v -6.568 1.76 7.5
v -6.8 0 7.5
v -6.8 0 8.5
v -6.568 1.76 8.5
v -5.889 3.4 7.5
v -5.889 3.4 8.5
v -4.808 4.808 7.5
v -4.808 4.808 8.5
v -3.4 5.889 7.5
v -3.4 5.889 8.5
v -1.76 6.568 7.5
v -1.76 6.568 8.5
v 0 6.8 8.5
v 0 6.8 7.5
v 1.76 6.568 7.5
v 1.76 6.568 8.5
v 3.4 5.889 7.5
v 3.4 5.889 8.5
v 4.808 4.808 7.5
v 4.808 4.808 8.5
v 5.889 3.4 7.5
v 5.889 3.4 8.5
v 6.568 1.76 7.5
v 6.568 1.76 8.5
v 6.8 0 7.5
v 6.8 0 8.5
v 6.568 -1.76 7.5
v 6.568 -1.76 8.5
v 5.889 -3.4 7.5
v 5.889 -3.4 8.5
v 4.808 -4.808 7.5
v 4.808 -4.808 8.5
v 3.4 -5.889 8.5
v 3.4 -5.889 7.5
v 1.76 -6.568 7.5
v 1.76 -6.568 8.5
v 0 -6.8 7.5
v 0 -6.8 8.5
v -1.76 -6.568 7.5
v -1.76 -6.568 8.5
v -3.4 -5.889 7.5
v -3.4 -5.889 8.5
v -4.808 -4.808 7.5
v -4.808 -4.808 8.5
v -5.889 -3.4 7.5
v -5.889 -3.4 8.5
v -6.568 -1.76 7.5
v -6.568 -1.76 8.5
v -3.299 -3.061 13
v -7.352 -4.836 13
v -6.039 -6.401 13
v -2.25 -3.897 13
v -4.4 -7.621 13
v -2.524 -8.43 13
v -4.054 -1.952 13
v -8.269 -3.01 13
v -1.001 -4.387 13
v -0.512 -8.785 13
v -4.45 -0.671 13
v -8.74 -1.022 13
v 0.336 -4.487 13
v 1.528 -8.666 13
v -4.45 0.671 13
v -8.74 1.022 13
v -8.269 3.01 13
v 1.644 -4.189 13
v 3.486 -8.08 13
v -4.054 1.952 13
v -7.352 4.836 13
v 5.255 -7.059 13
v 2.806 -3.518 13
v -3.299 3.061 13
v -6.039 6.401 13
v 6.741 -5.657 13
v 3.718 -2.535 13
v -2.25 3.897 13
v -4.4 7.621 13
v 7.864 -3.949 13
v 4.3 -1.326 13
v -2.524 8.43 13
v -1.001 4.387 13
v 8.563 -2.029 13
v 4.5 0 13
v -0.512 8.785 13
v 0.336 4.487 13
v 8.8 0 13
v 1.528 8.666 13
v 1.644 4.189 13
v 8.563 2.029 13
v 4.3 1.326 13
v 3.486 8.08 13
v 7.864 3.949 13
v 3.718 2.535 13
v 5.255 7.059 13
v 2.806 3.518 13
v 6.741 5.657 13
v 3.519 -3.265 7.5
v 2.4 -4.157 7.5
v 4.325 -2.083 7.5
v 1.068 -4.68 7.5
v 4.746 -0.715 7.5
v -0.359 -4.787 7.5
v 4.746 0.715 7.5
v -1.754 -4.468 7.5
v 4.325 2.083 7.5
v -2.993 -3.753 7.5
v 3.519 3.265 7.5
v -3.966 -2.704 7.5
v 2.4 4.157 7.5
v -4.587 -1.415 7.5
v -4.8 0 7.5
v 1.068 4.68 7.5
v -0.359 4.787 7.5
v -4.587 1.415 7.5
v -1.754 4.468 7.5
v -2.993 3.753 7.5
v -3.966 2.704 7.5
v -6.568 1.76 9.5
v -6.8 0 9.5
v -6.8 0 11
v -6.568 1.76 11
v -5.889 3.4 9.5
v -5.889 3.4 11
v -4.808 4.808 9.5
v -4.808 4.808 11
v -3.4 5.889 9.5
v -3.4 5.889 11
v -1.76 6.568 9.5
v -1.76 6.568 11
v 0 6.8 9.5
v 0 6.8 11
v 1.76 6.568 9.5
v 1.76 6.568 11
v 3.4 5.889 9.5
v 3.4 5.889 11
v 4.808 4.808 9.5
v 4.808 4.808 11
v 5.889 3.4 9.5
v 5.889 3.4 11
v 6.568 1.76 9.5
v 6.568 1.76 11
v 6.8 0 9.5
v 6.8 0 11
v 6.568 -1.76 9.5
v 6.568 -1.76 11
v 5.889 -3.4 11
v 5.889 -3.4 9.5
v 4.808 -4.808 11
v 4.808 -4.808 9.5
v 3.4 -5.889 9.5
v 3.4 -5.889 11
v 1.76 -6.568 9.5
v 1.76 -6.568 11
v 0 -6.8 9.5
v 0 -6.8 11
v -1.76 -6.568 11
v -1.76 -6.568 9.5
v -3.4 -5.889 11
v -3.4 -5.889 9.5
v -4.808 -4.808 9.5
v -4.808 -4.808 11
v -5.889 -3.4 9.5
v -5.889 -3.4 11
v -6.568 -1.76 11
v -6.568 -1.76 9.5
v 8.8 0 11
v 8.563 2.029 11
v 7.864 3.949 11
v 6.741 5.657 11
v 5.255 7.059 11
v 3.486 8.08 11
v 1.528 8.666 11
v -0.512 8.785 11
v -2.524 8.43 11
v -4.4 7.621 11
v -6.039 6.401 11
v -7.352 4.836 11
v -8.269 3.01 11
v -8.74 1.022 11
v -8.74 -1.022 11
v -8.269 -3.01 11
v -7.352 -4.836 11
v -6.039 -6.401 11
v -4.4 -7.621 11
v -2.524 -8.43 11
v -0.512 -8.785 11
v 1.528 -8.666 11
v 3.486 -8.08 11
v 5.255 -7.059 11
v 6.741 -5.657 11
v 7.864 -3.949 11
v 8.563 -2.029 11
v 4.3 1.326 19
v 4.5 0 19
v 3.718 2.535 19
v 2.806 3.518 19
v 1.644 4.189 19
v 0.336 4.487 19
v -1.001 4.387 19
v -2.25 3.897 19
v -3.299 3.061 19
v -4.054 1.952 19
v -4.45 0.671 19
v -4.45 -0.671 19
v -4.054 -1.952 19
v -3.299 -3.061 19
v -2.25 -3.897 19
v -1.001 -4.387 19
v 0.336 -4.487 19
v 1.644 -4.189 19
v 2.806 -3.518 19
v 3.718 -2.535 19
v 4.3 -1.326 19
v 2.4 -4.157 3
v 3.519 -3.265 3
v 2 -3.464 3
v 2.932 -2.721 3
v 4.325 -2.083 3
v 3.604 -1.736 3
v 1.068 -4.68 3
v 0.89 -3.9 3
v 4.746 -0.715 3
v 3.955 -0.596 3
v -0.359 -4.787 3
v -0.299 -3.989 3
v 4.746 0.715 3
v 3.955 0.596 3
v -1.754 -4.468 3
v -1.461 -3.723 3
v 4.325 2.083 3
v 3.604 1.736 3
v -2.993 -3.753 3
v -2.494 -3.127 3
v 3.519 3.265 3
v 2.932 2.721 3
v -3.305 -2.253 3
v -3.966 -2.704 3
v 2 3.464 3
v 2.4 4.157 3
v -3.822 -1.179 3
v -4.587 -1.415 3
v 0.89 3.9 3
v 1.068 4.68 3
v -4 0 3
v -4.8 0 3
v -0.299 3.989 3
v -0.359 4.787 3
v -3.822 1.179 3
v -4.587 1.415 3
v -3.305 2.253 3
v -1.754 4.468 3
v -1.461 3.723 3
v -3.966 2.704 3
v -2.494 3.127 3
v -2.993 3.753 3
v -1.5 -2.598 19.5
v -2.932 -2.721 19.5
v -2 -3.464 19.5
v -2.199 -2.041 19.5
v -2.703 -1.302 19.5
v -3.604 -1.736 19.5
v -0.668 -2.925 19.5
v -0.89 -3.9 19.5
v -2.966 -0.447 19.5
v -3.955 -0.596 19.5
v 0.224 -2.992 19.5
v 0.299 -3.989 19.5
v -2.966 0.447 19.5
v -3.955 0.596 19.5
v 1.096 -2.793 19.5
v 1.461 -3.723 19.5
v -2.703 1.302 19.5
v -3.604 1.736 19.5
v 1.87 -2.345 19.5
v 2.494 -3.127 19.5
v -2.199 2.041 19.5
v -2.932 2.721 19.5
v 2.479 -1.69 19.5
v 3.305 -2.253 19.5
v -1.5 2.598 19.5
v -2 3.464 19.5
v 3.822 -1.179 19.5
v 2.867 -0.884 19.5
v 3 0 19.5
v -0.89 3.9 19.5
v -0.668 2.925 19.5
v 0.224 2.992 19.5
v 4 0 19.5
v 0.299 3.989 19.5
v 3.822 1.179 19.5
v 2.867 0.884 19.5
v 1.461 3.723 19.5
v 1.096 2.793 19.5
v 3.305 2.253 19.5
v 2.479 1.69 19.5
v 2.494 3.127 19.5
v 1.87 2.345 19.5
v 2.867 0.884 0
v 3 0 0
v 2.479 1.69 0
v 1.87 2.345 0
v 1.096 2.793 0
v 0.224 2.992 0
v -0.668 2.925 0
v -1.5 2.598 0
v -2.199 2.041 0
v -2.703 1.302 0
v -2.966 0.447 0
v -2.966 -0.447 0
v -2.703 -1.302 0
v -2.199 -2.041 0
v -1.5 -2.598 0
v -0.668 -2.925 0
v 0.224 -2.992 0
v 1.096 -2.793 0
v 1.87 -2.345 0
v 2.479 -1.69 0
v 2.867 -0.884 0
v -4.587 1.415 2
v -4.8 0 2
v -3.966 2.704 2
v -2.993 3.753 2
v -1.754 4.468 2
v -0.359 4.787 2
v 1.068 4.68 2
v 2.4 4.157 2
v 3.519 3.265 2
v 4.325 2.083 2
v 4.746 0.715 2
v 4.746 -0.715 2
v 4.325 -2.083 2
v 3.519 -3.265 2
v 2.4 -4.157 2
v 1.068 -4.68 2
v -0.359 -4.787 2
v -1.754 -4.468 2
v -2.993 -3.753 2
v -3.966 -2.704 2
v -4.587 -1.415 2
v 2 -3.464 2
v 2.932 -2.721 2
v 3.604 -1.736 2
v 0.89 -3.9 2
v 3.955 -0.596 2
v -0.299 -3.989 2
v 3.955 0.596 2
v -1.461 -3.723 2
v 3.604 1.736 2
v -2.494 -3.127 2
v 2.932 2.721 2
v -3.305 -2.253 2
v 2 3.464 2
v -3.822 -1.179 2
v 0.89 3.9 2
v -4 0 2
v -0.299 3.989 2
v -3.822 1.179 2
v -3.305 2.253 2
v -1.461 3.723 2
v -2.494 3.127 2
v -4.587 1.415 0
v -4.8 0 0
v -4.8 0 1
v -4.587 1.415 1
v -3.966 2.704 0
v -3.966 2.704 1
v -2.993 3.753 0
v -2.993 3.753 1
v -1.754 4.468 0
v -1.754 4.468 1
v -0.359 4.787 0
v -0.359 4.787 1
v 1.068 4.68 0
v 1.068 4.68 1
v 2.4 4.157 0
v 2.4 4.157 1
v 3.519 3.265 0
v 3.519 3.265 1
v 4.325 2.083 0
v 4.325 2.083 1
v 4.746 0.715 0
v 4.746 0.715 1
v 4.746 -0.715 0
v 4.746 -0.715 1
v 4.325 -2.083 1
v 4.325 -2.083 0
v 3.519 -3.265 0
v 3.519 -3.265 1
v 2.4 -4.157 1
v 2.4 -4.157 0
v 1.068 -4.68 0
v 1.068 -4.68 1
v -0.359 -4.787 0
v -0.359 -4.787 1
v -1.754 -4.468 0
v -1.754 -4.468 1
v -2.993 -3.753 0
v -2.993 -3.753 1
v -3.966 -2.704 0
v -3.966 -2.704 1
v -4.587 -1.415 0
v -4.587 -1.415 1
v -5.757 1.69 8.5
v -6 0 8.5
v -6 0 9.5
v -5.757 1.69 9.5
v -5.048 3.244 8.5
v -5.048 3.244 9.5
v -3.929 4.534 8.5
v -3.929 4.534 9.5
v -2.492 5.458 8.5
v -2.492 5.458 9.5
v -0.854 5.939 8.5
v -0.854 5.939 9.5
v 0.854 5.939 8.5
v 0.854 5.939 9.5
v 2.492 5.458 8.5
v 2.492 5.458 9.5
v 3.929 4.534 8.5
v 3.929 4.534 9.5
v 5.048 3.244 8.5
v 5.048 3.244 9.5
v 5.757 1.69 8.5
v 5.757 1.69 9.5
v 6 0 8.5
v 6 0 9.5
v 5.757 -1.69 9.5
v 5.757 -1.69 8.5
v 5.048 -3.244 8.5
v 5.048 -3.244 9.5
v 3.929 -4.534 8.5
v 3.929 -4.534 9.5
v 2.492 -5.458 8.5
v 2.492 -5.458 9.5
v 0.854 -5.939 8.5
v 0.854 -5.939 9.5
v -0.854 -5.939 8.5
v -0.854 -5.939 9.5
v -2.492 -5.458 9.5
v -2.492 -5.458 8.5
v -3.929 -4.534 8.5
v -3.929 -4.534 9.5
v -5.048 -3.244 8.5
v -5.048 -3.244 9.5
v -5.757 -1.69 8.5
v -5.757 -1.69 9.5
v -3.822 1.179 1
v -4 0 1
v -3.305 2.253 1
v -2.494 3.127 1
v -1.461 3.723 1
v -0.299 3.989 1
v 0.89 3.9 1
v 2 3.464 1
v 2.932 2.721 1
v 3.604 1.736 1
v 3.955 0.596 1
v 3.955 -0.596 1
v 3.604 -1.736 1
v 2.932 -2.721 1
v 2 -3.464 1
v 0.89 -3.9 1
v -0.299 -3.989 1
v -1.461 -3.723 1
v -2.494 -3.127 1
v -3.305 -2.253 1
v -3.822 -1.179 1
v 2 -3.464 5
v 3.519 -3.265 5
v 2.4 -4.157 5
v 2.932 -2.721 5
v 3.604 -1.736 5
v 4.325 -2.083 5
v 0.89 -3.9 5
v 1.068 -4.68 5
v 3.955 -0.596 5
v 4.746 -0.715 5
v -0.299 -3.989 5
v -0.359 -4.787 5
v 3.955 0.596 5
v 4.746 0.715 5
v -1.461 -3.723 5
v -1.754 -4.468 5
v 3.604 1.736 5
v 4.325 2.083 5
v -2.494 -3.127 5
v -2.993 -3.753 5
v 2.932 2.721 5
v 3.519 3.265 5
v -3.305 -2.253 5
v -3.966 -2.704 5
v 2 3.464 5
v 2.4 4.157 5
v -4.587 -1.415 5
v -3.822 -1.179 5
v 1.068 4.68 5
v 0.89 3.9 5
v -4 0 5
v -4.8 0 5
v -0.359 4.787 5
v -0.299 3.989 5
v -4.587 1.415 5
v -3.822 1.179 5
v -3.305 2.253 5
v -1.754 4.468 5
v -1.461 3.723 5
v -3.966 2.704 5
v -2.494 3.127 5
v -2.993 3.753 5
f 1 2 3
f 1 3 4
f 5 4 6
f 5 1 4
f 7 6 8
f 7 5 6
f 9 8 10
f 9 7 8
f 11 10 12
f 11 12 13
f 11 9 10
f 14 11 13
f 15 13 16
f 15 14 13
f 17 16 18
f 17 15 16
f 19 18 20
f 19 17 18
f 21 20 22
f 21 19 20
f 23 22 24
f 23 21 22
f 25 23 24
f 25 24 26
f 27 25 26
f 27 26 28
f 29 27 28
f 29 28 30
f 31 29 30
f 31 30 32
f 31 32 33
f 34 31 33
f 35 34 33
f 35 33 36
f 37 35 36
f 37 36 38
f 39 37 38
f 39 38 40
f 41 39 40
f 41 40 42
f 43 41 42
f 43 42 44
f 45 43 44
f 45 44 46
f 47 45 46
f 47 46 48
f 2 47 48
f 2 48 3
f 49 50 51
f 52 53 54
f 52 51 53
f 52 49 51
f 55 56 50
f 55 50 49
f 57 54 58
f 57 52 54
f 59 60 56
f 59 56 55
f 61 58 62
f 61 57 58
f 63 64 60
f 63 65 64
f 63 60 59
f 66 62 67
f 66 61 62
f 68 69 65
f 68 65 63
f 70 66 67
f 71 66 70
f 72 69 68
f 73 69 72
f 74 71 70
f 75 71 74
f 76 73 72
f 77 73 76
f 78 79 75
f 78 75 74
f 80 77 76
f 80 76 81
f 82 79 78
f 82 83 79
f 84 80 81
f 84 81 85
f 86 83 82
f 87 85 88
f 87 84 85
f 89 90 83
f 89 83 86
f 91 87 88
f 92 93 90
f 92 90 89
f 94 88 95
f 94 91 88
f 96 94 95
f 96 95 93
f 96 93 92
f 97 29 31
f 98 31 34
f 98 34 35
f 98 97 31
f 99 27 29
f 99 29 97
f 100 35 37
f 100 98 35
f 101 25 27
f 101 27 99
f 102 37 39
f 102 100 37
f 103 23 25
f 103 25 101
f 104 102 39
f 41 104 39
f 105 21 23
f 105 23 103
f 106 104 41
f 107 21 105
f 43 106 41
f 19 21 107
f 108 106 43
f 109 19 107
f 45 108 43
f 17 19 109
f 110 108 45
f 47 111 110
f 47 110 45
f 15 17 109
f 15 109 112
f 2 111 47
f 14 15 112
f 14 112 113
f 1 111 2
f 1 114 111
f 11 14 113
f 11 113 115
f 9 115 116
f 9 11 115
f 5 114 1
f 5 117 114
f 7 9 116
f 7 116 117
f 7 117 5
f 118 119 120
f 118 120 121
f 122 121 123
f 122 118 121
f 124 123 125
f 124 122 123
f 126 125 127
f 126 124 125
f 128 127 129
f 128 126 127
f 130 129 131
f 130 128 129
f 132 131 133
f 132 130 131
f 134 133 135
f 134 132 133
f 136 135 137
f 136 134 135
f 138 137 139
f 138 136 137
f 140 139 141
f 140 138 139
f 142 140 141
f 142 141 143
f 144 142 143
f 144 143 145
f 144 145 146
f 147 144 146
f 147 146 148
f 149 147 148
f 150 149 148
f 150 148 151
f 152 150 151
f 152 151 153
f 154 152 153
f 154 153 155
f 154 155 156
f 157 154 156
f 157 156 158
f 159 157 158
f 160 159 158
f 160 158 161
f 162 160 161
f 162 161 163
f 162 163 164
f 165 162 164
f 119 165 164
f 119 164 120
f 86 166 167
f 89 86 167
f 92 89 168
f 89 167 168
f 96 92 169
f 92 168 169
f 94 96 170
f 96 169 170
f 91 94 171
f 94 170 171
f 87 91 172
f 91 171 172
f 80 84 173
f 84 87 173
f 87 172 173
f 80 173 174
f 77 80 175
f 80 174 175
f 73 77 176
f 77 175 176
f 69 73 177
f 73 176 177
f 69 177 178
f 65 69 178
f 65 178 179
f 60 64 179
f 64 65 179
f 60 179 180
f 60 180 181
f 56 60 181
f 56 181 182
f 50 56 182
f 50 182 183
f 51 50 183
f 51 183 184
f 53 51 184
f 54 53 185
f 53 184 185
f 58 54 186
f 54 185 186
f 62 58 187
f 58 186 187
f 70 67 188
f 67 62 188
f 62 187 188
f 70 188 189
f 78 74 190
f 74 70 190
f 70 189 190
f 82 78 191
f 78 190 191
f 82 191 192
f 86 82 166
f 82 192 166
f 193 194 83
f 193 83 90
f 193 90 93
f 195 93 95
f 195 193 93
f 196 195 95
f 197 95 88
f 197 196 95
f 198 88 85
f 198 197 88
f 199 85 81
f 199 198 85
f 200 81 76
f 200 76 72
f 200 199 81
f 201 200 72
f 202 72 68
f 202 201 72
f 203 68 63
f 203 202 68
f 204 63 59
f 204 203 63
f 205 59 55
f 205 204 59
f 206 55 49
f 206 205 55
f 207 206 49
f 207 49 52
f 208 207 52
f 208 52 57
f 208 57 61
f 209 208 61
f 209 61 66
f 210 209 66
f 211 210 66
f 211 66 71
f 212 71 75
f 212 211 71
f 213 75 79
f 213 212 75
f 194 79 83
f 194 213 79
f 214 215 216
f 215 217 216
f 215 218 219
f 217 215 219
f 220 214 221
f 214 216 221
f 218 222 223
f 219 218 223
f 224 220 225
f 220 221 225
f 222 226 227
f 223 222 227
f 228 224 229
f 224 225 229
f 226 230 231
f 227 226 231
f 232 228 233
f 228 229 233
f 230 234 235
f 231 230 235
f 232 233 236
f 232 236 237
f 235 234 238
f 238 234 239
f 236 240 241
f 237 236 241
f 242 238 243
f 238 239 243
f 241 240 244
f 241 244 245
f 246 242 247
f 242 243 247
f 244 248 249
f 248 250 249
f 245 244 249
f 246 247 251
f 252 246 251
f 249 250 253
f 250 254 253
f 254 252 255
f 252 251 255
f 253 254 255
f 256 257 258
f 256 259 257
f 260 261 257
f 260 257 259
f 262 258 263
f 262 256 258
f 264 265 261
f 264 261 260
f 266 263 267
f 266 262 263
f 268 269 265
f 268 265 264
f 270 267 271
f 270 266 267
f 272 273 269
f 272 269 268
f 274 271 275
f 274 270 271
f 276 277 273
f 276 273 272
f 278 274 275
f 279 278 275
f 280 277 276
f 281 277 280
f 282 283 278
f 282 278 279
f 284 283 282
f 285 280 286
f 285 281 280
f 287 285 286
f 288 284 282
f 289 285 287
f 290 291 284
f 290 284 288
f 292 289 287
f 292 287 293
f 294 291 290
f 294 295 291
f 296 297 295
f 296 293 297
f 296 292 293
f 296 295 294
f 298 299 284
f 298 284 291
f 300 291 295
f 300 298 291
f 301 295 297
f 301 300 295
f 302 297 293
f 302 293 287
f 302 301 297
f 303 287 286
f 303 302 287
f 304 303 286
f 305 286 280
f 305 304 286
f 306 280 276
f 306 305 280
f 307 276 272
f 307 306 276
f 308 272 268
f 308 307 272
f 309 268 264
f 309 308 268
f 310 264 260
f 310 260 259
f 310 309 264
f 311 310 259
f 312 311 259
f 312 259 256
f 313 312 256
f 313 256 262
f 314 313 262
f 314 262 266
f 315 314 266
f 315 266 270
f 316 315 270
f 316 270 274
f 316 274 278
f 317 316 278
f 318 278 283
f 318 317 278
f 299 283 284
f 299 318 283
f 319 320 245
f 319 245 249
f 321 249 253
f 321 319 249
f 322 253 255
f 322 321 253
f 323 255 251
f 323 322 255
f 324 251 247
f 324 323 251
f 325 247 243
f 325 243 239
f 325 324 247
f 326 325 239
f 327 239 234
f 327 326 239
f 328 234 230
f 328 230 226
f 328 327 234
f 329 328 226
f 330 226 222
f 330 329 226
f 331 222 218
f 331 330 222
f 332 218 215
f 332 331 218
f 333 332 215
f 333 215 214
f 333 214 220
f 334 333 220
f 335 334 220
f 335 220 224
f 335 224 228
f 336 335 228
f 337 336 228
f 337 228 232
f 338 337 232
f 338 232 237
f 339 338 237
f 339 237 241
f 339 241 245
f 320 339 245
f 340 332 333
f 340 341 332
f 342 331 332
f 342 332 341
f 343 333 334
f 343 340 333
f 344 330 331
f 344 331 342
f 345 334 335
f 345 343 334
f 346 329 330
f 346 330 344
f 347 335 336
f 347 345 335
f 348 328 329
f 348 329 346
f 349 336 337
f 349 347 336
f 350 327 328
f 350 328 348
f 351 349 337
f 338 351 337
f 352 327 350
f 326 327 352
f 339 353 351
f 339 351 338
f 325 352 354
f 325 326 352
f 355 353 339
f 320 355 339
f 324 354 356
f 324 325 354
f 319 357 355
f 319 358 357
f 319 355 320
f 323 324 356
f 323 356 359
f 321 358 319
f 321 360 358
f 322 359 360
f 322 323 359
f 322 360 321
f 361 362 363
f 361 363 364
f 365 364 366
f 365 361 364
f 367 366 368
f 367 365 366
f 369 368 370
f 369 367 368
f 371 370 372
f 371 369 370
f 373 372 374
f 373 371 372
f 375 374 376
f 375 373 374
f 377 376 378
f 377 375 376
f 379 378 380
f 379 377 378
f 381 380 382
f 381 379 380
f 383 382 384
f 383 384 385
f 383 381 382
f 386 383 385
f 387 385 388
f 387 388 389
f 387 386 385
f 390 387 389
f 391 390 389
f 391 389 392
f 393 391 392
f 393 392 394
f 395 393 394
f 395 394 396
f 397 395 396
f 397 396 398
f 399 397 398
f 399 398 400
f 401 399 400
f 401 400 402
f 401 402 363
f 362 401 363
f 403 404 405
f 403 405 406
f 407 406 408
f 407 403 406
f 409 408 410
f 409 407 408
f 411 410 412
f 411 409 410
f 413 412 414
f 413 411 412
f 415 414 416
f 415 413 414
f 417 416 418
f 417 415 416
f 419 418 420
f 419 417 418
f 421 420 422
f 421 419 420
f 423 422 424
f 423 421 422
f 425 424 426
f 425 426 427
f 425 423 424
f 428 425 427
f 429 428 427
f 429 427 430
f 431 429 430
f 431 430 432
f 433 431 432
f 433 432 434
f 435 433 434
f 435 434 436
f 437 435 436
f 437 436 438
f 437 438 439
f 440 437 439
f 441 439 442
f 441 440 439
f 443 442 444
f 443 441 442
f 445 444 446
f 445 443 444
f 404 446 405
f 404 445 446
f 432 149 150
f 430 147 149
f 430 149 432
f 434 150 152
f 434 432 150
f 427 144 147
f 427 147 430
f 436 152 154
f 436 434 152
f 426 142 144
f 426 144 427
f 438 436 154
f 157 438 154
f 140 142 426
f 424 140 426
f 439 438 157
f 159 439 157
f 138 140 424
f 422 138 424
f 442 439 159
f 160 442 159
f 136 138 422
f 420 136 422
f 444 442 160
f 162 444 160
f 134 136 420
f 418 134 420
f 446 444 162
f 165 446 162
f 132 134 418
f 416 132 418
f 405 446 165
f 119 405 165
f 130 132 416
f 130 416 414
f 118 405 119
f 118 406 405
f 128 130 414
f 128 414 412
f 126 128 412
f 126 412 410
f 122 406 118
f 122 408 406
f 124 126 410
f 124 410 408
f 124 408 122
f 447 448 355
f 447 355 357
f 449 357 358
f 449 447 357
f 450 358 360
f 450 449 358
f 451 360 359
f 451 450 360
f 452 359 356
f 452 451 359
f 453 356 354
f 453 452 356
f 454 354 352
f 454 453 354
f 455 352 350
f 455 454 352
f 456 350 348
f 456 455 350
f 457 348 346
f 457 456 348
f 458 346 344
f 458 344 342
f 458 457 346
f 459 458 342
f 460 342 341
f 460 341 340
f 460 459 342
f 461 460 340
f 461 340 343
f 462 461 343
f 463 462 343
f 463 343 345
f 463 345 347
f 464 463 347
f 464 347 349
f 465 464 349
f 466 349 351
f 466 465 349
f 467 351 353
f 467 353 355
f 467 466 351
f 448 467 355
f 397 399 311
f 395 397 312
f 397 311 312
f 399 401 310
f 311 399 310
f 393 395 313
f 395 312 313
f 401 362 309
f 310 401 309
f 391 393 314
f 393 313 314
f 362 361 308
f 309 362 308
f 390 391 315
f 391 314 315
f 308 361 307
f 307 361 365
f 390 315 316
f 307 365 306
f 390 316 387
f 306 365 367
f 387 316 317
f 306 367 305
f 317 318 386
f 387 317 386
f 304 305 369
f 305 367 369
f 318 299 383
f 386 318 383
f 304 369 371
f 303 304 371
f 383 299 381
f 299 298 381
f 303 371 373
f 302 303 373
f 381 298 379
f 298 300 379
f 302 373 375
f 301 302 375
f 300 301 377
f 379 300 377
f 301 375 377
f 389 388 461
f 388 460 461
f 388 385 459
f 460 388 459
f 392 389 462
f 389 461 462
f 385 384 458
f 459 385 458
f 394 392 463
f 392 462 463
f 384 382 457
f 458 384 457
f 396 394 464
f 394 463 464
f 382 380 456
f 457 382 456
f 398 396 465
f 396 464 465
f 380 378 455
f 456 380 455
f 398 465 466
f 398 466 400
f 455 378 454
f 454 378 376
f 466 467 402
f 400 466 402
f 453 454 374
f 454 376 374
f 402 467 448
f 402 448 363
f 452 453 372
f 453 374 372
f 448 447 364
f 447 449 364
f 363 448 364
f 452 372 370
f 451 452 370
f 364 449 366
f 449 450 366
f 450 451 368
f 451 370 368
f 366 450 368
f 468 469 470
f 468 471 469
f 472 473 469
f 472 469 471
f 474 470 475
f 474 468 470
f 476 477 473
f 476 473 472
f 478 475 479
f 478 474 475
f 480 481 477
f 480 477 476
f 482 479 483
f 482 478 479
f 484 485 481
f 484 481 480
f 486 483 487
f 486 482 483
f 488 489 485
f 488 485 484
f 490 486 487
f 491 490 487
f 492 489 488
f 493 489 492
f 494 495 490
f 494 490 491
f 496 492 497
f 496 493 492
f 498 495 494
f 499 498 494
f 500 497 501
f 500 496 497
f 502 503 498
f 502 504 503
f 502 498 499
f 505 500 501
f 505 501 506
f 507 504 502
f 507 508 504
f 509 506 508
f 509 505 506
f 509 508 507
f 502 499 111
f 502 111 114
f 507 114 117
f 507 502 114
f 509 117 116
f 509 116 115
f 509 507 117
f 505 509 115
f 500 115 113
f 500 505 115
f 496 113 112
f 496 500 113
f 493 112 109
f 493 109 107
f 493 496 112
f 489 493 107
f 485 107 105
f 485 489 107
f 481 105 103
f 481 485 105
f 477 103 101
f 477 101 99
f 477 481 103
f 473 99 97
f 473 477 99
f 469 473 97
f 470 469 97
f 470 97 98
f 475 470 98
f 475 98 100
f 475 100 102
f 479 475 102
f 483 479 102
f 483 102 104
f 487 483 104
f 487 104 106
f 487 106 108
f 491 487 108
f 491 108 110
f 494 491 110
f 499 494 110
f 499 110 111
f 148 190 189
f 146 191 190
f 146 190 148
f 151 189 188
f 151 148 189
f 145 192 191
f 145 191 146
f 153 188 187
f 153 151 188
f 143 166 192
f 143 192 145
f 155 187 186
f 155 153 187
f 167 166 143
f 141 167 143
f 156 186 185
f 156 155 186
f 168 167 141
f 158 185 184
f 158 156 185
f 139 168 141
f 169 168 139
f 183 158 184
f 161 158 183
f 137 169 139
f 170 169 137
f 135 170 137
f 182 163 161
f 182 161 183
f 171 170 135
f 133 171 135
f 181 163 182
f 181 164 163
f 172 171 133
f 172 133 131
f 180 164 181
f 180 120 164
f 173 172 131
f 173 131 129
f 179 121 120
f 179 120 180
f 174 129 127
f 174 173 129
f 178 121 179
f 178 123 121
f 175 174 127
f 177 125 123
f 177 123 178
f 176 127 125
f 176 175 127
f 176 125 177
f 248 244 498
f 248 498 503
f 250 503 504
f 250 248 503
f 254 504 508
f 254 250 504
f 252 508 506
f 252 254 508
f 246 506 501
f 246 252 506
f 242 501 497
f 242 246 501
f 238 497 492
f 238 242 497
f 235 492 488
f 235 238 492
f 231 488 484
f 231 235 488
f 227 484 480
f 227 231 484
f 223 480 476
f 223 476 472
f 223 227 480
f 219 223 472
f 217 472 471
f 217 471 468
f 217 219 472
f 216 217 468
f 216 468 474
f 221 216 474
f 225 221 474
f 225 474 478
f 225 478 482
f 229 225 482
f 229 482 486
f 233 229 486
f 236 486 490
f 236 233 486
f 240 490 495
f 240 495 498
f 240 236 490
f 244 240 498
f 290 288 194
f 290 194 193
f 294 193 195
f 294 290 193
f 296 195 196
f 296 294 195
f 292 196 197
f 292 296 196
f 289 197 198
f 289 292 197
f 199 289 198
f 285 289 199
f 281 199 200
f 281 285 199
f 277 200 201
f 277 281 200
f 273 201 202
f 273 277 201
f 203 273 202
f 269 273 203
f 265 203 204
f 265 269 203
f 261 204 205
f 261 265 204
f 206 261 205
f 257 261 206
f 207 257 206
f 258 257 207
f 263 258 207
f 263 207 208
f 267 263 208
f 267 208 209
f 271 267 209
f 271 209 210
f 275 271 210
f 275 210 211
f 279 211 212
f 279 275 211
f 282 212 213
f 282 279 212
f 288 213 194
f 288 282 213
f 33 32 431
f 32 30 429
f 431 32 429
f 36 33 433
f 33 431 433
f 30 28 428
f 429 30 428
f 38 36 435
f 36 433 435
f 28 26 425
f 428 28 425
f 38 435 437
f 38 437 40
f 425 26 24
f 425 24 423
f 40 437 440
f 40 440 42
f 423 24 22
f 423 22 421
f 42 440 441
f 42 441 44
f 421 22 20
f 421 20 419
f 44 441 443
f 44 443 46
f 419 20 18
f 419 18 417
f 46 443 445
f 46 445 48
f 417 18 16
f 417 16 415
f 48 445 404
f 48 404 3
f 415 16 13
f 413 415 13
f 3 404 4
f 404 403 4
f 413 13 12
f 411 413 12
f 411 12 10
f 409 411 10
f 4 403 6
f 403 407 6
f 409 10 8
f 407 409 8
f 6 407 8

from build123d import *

# Parameters (mm, degrees)
SKETCH1_R           = 8.8
SKETCH1_R_2         = 3
BOSS_EXTRUDE1_DEPTH = 19.5
SKETCH2_OUTSIDE_W   = 25.924
SKETCH2_OUTSIDE_H   = 25.924
SKETCH2_OUTSIDE_R   = 4.5
CUT_EXTRUDE1_DEPTH  = 6.5
SKETCH3_OUTSIDE_W   = 25.924
SKETCH3_OUTSIDE_H   = 25.924
SKETCH3_OUTSIDE_R   = 6.8
CUT_EXTRUDE2_DEPTH  = 11
SKETCH5_OUTSIDE_W   = 25.924
SKETCH5_OUTSIDE_H   = 25.924
SKETCH5_OUTSIDE_R   = 4.8
CUT_EXTRUDE3_DEPTH  = 7.5
CUT_EXTRUDE4_START  = -1
SKETCH4_OUTSIDE_W   = 25.924
SKETCH4_OUTSIDE_H   = 25.924
SKETCH4_OUTSIDE_R   = 6
CUT_EXTRUDE4_DEPTH  = 1
CUT_EXTRUDE5_START  = -1
SKETCH6_OUTSIDE_W   = 25.924
SKETCH6_OUTSIDE_H   = 25.924
SKETCH6_OUTSIDE_R   = 4
CUT_EXTRUDE5_DEPTH  = 1
CUT_EXTRUDE6_START  = -3
SKETCH6_2_OUTSIDE_W = 25.924
SKETCH6_2_OUTSIDE_H = 25.924
SKETCH6_2_OUTSIDE_R = 4
CUT_EXTRUDE6_DEPTH  = 2
CHAMFER1_SIZE       = 0.5


with BuildPart() as part:
    # Sketch1 → Boss-Extrude1 (new body)
    with BuildSketch(Plane.XY):
        Circle(SKETCH1_R)
        Circle(SKETCH1_R_2, mode=Mode.SUBTRACT)
    extrude(amount=BOSS_EXTRUDE1_DEPTH)

    # Sketch2 outside → Cut-Extrude1 (cut)
    with BuildSketch(Plane.XY.offset(19.5)):
        Rectangle(SKETCH2_OUTSIDE_W, SKETCH2_OUTSIDE_H)
        Circle(SKETCH2_OUTSIDE_R, mode=Mode.SUBTRACT)
    extrude(amount=-CUT_EXTRUDE1_DEPTH, mode=Mode.SUBTRACT)

    # Sketch3 outside → Cut-Extrude2 (cut)
    with BuildSketch(Plane(origin=(0, 0, 0), x_dir=(-1, 0, 0), z_dir=(0, 0, -1))):
        Rectangle(SKETCH3_OUTSIDE_W, SKETCH3_OUTSIDE_H)
        Circle(SKETCH3_OUTSIDE_R, mode=Mode.SUBTRACT)
    extrude(amount=-CUT_EXTRUDE2_DEPTH, mode=Mode.SUBTRACT)

    # Sketch5 outside → Cut-Extrude3 (cut)
    with BuildSketch(Plane(origin=(0, 0, 0), x_dir=(-1, 0, 0), z_dir=(0, 0, -1))):
        Rectangle(SKETCH5_OUTSIDE_W, SKETCH5_OUTSIDE_H)
        Circle(SKETCH5_OUTSIDE_R, mode=Mode.SUBTRACT)
    extrude(amount=-CUT_EXTRUDE3_DEPTH, mode=Mode.SUBTRACT)

    # Sketch4 outside → Cut-Extrude4 (cut)
    with BuildSketch(Plane(origin=(0, 0, 7.5), x_dir=(-1, 0, 0), z_dir=(0, 0, -1)).offset(CUT_EXTRUDE4_START)):
        Rectangle(SKETCH4_OUTSIDE_W, SKETCH4_OUTSIDE_H)
        Circle(SKETCH4_OUTSIDE_R, mode=Mode.SUBTRACT)
    extrude(amount=-CUT_EXTRUDE4_DEPTH, mode=Mode.SUBTRACT)

    # Sketch6 outside → Cut-Extrude5 (cut)
    with BuildSketch(Plane(origin=(0, 0, 0), x_dir=(-1, 0, 0), z_dir=(0, 0, -1)).offset(CUT_EXTRUDE5_START)):
        Rectangle(SKETCH6_OUTSIDE_W, SKETCH6_OUTSIDE_H)
        Circle(SKETCH6_OUTSIDE_R, mode=Mode.SUBTRACT)
    extrude(amount=-CUT_EXTRUDE5_DEPTH, mode=Mode.SUBTRACT)

    # Sketch6<2> outside → Cut-Extrude6 (cut)
    with BuildSketch(Plane(origin=(0, 0, 0), x_dir=(-1, 0, 0), z_dir=(0, 0, -1)).offset(CUT_EXTRUDE6_START)):
        Rectangle(SKETCH6_2_OUTSIDE_W, SKETCH6_2_OUTSIDE_H)
        Circle(SKETCH6_2_OUTSIDE_R, mode=Mode.SUBTRACT)
    extrude(amount=-CUT_EXTRUDE6_DEPTH, mode=Mode.SUBTRACT)

    # Chamfer1
    chamfer1_edges = [part.edges().sort_by_distance(p)[0] for p in [
        (-4.5, 0, 19.5),
    ]]
    chamfer(chamfer1_edges, length=CHAMFER1_SIZE)


solid = part.part
